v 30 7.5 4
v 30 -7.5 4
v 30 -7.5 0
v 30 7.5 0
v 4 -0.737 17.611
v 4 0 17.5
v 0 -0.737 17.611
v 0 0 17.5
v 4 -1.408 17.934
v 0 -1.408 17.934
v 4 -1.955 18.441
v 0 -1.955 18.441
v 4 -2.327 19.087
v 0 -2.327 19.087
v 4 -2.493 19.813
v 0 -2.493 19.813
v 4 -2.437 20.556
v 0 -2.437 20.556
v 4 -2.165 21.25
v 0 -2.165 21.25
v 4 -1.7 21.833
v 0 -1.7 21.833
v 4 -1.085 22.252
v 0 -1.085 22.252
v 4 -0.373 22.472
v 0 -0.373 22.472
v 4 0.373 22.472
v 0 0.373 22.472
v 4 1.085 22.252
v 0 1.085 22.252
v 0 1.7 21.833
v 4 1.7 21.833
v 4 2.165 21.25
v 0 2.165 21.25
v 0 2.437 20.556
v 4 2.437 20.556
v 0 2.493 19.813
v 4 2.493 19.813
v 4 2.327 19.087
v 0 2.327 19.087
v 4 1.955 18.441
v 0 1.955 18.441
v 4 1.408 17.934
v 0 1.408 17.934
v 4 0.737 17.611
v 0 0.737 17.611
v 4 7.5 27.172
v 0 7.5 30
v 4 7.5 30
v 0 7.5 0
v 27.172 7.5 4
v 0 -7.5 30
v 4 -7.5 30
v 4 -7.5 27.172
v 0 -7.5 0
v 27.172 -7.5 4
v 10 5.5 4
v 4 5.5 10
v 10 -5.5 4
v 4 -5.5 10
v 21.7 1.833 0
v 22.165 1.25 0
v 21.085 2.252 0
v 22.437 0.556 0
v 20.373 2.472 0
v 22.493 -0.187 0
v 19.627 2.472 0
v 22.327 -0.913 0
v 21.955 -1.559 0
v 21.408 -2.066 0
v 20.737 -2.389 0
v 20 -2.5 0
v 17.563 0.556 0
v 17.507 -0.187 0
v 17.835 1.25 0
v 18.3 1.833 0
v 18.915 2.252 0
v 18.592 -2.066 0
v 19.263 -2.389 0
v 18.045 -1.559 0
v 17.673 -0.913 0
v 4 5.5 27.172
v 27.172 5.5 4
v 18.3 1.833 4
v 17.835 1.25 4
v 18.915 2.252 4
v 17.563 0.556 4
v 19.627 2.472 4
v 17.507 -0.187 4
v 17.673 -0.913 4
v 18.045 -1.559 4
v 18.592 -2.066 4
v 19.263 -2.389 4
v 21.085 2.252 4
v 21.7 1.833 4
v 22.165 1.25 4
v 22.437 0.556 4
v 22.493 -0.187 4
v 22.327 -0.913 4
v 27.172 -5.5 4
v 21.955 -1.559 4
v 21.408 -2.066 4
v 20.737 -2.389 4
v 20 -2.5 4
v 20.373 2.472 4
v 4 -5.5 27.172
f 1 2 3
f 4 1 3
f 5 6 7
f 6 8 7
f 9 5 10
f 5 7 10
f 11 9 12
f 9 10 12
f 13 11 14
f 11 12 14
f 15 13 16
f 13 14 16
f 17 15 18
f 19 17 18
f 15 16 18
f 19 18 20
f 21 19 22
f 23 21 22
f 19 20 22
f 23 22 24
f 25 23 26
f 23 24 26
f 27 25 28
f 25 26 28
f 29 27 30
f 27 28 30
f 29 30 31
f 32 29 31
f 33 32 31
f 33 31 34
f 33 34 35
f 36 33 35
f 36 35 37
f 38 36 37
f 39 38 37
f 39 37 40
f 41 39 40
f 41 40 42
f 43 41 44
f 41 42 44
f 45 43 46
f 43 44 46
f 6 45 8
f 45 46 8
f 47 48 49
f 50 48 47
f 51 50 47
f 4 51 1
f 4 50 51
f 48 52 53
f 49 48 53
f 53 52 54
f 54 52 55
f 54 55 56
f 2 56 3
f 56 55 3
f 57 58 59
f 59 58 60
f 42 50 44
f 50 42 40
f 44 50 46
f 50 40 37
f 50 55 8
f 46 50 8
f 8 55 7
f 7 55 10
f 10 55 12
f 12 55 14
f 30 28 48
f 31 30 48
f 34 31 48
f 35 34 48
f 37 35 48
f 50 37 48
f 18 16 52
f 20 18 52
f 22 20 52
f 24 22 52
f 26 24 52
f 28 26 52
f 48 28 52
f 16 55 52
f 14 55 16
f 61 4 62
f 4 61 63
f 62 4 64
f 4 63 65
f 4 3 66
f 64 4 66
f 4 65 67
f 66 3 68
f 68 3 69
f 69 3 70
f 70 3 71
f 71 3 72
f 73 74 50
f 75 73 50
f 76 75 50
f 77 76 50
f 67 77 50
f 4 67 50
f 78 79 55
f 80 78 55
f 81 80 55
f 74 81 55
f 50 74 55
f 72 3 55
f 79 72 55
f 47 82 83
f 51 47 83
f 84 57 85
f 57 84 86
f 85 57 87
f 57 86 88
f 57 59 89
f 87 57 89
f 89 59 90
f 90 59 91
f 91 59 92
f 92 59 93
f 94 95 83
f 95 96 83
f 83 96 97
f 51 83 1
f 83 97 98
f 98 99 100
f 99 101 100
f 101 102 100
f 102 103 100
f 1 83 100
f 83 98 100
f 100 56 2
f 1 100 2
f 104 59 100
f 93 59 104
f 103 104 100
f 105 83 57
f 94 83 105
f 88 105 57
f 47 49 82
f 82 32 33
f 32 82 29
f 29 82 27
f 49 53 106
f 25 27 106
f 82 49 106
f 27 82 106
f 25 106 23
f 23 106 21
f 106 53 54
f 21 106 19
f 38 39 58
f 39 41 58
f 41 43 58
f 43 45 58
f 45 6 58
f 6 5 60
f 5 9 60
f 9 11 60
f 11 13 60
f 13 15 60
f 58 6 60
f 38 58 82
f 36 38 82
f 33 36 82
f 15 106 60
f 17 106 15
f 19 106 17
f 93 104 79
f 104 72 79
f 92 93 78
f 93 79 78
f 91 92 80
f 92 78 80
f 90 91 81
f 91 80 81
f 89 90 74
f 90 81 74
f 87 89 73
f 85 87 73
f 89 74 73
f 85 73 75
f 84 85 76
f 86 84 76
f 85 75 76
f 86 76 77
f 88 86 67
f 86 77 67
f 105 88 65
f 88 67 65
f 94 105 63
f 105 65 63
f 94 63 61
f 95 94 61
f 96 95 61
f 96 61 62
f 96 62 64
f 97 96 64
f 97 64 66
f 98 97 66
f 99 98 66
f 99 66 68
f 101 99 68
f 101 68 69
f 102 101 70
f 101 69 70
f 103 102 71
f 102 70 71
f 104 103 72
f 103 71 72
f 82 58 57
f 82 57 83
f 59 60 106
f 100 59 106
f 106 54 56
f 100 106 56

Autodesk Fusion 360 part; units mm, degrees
sketch "スケッチ1" plane through (0, 0, 0) normal (0, 1, 0) x (1, 0, 0)
  line L0 (0, 0) -> (0, -30)
  line L1 (0, -30) -> (4, -30)
  line L2 (4, -30) -> (4, -4)
  line L3 (4, -27.1719) -> (27.1719, -4)
  line L4 (4, -4) -> (30, -4)
  line L5 (30, -4) -> (30, 0)
  line L6 (30, 0) -> (0, 0)
  dimension "d1" = 30
  dimension "d2" = 30
  dimension "d3" = 4
  dimension "d4" = 4
  dimension "d5" = 32.77
  dimension "d6" = 45
extrude "押し出し1" add sketch "スケッチ1" along normal mid plane 15
extrude "押し出し2" cut sketch "スケッチ1" along normal mid plane 11 contours L2 L3 L4
chamfer "面取り1" distance 6 angle 45 1 edges at (4, 0, 4)
hole "穴1" at (20, 0, 4) direction (0, 0, -1) diameter 5 depth 4 tip angle 118
hole "穴2" at (4, 0, 20) direction (-1, 0, 0) diameter 5 depth 4 tip angle 118
